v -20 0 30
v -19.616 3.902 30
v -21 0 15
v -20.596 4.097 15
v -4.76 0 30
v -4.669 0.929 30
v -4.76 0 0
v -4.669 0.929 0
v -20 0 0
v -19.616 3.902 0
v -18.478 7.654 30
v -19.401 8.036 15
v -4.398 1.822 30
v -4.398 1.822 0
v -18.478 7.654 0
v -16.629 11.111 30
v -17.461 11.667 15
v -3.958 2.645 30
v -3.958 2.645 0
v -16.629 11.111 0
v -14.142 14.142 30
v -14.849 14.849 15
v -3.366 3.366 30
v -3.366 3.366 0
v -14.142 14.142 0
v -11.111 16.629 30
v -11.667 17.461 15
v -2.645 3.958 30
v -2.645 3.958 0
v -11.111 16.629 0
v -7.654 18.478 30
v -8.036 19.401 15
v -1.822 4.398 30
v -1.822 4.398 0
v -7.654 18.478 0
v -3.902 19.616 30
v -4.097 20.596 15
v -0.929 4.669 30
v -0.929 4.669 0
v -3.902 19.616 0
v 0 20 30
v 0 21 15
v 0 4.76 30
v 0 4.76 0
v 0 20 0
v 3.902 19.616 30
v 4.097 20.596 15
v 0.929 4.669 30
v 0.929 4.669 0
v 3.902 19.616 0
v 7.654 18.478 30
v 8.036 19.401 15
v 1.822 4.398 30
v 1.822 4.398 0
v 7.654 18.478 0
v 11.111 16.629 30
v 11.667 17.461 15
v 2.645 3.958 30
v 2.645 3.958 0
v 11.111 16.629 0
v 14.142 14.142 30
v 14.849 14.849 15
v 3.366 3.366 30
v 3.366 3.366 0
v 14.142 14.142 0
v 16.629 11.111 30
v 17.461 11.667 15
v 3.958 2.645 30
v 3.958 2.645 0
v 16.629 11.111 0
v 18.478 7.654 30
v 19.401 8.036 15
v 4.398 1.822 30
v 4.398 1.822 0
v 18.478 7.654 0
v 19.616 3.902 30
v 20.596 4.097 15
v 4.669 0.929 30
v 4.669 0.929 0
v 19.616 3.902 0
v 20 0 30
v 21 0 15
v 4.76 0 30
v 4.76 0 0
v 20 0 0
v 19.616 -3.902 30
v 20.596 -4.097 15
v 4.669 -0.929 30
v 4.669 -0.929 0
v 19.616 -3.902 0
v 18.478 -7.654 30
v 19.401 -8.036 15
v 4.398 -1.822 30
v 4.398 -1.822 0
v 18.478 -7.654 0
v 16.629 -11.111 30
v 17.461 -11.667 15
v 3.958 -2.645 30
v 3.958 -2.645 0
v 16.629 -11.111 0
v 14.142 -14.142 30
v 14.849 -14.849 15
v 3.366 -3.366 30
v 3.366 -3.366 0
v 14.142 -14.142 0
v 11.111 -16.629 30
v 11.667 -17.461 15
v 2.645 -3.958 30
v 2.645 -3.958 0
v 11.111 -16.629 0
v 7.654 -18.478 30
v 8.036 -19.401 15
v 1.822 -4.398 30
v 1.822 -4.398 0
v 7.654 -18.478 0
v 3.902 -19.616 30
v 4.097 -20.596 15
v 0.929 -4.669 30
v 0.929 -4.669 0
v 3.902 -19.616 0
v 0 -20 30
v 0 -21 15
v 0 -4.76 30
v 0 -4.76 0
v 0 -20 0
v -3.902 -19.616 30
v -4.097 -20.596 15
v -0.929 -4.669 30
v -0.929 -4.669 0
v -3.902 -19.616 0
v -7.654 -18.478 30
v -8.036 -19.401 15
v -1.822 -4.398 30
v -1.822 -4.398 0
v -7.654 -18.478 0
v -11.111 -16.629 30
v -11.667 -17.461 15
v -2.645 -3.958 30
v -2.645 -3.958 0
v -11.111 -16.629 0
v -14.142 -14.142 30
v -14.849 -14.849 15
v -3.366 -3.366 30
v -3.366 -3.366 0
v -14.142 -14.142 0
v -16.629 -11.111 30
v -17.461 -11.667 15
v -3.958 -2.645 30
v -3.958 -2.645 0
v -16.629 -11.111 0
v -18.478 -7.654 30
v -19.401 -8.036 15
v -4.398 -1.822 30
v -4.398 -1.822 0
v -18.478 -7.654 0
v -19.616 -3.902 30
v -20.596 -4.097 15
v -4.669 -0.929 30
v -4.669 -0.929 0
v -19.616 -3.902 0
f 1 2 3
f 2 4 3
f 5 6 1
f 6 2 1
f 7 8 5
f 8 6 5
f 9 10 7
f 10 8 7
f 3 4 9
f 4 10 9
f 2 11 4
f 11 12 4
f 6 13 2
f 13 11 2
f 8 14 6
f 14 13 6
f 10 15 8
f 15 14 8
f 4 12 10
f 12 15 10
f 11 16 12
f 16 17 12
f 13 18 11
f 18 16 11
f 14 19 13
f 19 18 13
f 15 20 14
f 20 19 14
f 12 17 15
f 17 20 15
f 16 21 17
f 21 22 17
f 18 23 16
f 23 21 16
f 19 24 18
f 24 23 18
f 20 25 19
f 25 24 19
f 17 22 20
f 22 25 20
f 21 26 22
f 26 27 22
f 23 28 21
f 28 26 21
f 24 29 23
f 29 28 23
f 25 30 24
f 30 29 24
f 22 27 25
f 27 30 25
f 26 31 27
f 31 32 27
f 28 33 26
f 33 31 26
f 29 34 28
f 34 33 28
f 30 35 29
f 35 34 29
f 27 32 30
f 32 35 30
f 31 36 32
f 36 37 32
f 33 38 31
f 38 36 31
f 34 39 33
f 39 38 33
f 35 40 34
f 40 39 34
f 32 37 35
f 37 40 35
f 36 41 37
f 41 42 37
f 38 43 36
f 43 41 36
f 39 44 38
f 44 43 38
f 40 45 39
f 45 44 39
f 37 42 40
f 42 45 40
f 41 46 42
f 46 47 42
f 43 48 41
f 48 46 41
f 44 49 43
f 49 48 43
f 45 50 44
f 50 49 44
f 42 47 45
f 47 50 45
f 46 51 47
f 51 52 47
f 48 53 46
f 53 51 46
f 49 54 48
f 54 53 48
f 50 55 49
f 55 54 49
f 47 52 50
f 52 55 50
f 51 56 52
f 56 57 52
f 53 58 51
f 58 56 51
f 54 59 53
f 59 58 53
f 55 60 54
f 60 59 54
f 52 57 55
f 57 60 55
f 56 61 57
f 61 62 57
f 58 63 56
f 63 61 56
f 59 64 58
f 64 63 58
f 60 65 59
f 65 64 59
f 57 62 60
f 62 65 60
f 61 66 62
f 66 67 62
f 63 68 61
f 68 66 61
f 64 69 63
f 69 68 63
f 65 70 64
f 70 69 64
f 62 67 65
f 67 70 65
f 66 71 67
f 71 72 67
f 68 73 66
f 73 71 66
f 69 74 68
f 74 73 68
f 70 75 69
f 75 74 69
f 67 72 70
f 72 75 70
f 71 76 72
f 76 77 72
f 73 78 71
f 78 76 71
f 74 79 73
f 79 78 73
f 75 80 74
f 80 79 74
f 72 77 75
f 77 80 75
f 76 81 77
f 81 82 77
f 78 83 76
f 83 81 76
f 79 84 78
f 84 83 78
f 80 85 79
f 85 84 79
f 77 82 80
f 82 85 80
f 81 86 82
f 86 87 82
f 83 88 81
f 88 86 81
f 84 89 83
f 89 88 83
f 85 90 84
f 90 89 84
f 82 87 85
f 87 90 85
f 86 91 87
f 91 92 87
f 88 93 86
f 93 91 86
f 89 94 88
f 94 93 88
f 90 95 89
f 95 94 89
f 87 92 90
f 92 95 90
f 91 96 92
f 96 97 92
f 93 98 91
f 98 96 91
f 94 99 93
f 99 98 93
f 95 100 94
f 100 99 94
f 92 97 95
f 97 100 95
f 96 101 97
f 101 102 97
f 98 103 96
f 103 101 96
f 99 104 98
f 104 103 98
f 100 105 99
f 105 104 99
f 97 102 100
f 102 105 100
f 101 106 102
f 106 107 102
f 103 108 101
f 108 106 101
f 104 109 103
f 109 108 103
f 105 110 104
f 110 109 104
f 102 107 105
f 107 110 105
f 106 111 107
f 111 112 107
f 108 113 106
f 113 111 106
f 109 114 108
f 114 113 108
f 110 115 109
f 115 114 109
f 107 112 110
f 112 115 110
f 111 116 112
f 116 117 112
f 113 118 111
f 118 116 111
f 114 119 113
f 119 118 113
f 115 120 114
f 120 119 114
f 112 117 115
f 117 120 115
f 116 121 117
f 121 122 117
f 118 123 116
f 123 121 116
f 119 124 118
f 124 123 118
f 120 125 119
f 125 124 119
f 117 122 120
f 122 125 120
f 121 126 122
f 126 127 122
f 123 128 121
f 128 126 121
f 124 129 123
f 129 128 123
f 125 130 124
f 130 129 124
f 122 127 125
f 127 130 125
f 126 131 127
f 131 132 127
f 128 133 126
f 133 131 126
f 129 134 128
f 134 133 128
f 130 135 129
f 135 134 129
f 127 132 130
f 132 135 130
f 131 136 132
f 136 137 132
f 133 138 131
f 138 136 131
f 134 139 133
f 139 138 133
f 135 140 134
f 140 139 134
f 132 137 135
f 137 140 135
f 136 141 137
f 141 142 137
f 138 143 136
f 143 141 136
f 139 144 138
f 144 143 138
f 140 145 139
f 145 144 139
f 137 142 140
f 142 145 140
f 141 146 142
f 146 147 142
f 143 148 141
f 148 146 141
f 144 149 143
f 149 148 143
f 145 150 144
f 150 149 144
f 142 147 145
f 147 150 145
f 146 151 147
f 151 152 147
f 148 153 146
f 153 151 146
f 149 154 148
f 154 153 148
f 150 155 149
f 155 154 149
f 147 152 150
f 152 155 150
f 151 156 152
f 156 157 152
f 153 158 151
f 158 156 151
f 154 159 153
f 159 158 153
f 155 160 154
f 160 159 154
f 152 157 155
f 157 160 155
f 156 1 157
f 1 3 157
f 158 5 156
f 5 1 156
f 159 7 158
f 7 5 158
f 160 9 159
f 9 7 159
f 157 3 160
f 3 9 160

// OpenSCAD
$fn = 32;

// ----------------------------------------------------------------------
// Belt roller: 40 mm barrel, 30 mm wide, bore 9.52 mm
// ----------------------------------------------------------------------

// --- parameters (mm) ---
bore_d = 9.52;            // bore
barrel_d = 40;            // barrel diameter
roller_w = 30;            // roller width
crown = 1;                // crown height at mid width

roller_profile = [[4.76, 0], [20, 0], [21, 15], [20, 30], [4.76, 30]];

/* the profile stays clear of the axis, so the bore comes out of the revolve */
rotate_extrude() polygon(roller_profile);
